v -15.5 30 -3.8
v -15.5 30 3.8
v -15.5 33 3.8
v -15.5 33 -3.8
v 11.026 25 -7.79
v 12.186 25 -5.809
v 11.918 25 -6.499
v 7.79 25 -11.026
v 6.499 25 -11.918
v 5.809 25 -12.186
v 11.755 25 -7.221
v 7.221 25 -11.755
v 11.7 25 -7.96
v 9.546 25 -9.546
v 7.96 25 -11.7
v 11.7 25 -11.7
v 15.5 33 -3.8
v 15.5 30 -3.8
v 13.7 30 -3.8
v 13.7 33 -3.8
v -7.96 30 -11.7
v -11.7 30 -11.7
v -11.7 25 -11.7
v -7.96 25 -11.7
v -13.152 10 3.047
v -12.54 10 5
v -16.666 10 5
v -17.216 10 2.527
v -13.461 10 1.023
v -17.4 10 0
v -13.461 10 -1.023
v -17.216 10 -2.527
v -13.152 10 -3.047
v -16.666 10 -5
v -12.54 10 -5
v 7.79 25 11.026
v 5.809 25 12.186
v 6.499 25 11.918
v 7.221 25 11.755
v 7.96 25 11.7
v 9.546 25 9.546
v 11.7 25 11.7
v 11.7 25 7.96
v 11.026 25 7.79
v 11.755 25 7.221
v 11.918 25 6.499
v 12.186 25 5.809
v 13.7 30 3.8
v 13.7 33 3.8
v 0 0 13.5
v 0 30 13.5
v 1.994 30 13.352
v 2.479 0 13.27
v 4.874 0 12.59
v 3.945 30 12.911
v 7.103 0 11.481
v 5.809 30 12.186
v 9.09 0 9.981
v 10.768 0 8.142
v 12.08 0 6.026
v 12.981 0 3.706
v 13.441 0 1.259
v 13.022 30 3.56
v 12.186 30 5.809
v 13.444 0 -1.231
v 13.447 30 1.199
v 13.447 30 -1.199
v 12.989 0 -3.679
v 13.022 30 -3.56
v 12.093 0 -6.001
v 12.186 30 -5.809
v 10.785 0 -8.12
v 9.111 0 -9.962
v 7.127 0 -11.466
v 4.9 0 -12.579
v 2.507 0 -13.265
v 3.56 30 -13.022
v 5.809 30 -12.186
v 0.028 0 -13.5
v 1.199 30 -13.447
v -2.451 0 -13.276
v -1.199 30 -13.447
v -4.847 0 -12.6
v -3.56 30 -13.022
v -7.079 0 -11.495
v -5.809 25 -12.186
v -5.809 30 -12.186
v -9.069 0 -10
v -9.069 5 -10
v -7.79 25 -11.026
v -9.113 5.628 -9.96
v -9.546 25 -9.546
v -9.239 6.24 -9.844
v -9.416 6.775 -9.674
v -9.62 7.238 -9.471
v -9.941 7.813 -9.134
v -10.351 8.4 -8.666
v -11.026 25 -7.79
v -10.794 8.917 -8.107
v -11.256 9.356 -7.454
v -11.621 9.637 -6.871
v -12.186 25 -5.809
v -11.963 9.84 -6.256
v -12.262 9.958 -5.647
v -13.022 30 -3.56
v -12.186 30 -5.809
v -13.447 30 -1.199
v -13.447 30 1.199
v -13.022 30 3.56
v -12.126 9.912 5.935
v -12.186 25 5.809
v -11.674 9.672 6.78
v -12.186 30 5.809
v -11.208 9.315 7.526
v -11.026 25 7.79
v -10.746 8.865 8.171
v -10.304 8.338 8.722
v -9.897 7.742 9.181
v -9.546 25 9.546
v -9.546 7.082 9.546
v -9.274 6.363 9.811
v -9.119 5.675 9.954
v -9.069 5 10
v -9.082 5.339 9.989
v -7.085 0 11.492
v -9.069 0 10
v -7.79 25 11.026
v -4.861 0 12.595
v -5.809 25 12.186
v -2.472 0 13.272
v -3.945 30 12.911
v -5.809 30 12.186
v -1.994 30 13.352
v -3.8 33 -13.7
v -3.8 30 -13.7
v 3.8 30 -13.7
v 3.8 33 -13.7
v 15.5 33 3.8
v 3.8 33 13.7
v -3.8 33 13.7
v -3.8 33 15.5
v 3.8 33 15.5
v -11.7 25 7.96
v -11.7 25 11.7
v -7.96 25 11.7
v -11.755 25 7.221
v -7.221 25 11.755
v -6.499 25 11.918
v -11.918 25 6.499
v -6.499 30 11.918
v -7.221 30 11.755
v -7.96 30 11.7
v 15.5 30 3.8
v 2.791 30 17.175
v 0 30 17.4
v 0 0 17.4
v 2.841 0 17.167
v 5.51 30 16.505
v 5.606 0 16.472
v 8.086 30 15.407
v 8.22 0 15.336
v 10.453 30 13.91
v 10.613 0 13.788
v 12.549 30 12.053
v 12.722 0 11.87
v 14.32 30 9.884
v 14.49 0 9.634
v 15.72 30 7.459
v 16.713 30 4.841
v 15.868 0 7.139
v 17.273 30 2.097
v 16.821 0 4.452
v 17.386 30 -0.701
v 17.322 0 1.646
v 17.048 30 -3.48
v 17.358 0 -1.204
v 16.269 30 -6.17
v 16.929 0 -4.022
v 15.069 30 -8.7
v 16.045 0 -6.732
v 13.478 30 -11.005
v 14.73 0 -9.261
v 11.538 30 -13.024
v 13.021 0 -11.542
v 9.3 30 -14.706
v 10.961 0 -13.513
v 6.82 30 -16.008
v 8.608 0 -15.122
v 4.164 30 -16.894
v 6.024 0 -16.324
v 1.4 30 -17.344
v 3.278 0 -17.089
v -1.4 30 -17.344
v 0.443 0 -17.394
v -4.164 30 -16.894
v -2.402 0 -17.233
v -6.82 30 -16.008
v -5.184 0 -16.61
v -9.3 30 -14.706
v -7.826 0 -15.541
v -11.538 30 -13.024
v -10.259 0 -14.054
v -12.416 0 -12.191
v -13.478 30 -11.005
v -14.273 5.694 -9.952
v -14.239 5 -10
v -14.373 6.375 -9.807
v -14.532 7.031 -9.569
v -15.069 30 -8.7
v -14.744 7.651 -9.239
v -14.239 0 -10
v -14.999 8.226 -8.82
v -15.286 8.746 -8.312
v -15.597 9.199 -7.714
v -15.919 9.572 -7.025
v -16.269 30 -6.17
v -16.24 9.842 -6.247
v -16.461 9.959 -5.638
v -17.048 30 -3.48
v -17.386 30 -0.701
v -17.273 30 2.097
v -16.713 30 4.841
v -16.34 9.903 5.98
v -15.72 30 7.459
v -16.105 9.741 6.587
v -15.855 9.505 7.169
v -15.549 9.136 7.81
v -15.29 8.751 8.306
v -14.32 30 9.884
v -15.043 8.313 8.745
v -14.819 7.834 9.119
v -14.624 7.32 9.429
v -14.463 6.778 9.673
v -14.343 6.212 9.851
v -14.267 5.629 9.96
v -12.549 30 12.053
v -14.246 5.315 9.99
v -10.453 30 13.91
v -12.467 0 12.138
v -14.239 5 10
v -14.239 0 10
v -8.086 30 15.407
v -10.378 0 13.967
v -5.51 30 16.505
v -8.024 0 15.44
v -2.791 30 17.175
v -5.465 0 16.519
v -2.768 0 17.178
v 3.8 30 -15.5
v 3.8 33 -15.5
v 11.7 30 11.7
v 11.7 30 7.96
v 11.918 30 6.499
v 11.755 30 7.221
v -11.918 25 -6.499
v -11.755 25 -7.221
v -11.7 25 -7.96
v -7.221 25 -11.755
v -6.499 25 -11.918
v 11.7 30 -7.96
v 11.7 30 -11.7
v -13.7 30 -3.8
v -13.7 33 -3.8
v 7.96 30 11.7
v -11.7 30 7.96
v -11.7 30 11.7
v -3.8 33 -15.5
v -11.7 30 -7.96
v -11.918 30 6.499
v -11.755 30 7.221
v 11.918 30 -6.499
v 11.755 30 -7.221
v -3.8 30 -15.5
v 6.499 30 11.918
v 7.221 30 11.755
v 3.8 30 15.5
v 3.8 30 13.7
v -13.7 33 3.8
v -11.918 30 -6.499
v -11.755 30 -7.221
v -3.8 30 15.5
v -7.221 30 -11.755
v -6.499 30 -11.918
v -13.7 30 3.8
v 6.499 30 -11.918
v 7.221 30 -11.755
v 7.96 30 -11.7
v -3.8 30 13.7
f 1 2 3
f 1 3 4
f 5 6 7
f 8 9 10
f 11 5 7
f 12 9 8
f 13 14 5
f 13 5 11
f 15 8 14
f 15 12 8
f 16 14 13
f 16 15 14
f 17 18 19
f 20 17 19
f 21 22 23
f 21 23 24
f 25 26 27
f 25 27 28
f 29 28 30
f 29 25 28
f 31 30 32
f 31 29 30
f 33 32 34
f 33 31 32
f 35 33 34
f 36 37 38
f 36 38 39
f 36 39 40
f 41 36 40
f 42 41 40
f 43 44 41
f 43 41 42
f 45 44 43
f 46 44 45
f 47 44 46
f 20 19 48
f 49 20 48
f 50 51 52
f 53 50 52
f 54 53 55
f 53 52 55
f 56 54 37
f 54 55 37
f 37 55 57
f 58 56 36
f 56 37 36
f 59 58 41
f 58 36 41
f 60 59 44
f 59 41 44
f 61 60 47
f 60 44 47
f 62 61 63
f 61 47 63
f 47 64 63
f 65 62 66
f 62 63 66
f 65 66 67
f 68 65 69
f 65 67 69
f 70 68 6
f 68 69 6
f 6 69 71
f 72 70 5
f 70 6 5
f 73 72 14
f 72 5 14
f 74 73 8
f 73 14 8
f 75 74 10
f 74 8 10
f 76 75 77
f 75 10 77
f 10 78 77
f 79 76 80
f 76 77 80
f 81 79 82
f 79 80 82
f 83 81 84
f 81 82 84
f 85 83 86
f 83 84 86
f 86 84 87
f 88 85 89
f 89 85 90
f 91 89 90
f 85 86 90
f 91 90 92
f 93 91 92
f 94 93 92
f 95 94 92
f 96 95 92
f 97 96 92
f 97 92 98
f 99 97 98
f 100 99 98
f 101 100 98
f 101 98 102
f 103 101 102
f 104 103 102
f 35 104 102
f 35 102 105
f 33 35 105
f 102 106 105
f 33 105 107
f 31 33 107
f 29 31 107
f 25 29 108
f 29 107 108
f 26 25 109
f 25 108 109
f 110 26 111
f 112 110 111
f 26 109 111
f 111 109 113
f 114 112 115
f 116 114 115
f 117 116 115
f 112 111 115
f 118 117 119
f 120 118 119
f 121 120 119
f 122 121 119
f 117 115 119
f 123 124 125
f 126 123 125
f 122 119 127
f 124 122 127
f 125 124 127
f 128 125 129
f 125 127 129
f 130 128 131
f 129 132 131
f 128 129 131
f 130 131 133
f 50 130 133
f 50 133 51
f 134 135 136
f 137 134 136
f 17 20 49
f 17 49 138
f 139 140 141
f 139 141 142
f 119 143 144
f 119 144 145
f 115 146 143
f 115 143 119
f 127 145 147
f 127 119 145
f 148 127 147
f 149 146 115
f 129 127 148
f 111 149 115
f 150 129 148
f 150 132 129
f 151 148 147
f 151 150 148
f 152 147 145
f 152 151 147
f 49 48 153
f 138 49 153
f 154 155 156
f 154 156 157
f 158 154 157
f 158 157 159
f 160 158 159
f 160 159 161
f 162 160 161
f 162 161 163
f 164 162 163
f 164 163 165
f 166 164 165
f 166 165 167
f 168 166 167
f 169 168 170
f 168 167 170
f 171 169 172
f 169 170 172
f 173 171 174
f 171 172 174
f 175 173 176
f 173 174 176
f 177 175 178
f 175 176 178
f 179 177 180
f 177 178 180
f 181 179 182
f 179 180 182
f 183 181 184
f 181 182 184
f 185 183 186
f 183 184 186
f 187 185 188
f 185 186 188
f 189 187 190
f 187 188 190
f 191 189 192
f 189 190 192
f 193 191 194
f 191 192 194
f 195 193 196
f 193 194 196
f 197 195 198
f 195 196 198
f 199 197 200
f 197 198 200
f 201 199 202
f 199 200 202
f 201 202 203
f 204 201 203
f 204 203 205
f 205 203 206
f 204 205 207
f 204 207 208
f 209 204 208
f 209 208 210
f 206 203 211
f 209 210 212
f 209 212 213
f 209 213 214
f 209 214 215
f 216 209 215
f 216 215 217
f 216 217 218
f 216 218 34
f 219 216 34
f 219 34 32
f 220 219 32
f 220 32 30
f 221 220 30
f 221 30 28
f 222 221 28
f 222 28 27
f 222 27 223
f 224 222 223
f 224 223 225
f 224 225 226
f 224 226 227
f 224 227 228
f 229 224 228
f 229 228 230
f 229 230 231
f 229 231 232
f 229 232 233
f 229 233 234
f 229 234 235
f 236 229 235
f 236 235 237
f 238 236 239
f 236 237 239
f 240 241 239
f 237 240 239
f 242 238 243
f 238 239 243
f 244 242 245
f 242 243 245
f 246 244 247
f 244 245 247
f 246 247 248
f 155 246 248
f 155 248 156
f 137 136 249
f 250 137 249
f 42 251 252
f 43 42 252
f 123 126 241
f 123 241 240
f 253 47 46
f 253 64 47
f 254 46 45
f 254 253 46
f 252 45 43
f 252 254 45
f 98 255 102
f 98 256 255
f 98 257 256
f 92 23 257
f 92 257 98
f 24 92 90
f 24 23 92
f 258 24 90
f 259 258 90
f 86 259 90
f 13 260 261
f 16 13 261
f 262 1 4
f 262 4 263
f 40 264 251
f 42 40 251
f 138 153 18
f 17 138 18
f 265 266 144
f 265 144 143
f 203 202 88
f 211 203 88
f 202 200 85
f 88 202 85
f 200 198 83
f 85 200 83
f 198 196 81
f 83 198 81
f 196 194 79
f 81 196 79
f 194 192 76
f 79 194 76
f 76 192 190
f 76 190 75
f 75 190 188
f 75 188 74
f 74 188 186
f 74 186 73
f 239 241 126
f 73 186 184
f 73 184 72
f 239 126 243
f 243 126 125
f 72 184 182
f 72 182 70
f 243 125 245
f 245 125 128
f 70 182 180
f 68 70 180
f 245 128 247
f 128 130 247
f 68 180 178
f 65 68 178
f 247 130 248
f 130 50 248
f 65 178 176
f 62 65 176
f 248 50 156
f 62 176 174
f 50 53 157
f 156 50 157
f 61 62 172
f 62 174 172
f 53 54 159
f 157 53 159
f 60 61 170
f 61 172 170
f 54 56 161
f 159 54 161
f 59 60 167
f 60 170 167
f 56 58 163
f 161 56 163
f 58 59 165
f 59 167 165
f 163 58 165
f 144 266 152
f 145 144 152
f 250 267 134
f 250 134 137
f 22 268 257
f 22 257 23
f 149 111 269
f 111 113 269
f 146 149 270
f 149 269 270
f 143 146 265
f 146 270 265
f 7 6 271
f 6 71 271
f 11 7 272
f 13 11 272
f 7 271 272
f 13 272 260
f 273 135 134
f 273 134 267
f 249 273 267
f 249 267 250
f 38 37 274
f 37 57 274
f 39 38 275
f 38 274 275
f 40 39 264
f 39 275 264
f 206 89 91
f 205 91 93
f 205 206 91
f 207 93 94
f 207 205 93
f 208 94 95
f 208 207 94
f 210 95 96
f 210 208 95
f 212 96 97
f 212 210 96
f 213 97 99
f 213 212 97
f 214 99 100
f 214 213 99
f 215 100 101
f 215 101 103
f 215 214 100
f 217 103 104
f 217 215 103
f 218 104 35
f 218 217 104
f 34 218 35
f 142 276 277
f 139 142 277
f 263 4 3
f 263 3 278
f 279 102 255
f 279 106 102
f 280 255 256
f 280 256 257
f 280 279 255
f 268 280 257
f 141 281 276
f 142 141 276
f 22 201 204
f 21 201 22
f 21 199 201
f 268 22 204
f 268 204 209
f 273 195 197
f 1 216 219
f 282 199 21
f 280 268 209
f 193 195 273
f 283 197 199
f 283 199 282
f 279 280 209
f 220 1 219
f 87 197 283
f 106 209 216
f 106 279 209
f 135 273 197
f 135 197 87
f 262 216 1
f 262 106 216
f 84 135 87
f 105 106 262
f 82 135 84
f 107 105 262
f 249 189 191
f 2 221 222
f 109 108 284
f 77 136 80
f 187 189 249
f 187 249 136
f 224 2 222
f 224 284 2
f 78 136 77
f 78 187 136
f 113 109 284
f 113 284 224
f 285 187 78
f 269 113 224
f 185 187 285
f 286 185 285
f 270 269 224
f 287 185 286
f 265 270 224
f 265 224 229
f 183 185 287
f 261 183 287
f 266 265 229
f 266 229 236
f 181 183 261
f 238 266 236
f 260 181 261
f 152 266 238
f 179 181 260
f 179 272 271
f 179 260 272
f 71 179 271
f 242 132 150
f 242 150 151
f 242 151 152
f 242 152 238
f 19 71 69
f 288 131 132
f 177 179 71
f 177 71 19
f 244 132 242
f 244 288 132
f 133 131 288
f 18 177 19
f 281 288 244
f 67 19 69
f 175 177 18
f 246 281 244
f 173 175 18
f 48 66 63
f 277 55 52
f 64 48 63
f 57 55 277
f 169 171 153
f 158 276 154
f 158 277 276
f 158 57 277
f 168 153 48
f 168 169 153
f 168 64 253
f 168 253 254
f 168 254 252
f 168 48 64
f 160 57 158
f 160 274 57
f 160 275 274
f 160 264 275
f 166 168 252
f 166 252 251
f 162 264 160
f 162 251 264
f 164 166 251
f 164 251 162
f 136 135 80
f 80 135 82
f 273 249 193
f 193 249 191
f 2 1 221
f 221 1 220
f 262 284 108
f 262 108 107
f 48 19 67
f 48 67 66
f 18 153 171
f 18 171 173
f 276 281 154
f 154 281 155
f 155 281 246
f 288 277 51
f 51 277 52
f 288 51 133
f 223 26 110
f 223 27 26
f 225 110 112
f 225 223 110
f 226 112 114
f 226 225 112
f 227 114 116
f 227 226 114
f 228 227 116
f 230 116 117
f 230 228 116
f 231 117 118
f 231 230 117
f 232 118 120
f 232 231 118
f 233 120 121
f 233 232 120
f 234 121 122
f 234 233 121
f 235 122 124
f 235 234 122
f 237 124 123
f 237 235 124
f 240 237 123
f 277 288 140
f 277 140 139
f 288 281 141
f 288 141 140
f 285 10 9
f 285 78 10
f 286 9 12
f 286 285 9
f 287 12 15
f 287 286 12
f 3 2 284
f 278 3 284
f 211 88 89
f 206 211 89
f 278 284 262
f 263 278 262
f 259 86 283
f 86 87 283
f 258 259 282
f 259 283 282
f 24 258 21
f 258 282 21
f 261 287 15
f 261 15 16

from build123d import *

# Parameters (mm, degrees)
SKETCH_1_R          = 17.4
EXTRUDE_1_DEPTH     = 30
SKETCH_2_R          = 13.5
CUT_EXTRUDE_1_DEPTH = 39.801030914
SKETCH_3_W          = 7.6
SKETCH_3_H          = 1.8
SKETCH_3_W_2        = 1.8
SKETCH_3_H_2        = 7.6
EXTRUDE_2_DEPTH     = 3
SKETCH_4_W          = 20
SKETCH_4_H          = 10
CUT_EXTRUDE_2_DEPTH = 42.164547854
FILLET_1_R          = 5
SKETCH_5_W          = 23.4
SKETCH_5_H          = 23.4
CUT_EXTRUDE_3_DEPTH = 5
FILLET_2_R          = 5


with BuildPart() as part:
    # 草图1 → 凸台-拉伸1 (new body)
    with BuildSketch(Plane(origin=(0, 0, 0), x_dir=(1, 0, 0), z_dir=(0, 1, 0))):
        with Locations(Location((0, 0, 0), (0, 0, 270))):
            Circle(SKETCH_1_R)
    extrude(amount=EXTRUDE_1_DEPTH)

    # 草图2 → 切除-拉伸1 (cut, through all)
    with BuildSketch(Plane(origin=(0, 30, 0), x_dir=(1, 0, 0), z_dir=(0, 1, 0))):
        with Locations(Location((0, 0, 0), (0, 0, 270))):
            Circle(SKETCH_2_R)
    extrude(amount=-CUT_EXTRUDE_1_DEPTH, mode=Mode.SUBTRACT)

    # 草图3 → 凸台-拉伸2 (add)
    with BuildSketch(Plane(origin=(0, 30, 0), x_dir=(1, 0, 0), z_dir=(0, 1, 0))):
        Polygon((13.7, 3.8), (13.7, 0), (13.7, -3.8), (15.5, -3.8), (15.5, 3.8), align=None)
        with Locations((0, -14.6)):
            Rectangle(SKETCH_3_W, SKETCH_3_H)
        with Locations((-14.6, 0)):
            Rectangle(SKETCH_3_W_2, SKETCH_3_H_2)
        with Locations((0, 14.6)):
            Rectangle(SKETCH_3_W, SKETCH_3_H)
    extrude(amount=EXTRUDE_2_DEPTH)

    # 草图4 → 切除-拉伸2 (cut, through all)
    with BuildSketch(Plane(origin=(0, 0, 0), x_dir=(0, 0, -1), z_dir=(1, 0, 0))):
        with Locations((0, 5)):
            Rectangle(SKETCH_4_W, SKETCH_4_H)
    extrude(amount=-CUT_EXTRUDE_2_DEPTH, mode=Mode.SUBTRACT)

    # 圆角1
    fillet_1_edges = [part.edges().sort_by_distance(p)[0] for p in [
        (-11.654280291, 10, -10),
        (-11.654280291, 10, 10),
    ]]
    fillet(fillet_1_edges, radius=FILLET_1_R)

    # 草图5 → 切除-拉伸3 (cut)
    with BuildSketch(Plane(origin=(0, 30, 0), x_dir=(1, 0, 0), z_dir=(0, 1, 0))):
        Rectangle(SKETCH_5_W, SKETCH_5_H)
    extrude(amount=-CUT_EXTRUDE_3_DEPTH, mode=Mode.SUBTRACT)

    # 圆角2
    fillet_2_edges = [part.edges().sort_by_distance(p)[0] for p in [
        (11.7, 27.5, -6.734983296),
        (11.7, 27.5, 6.734983296),
        (6.734983296, 27.5, 11.7),
        (-6.734983296, 27.5, 11.7),
        (-11.7, 27.5, 6.734983296),
        (-11.7, 27.5, -6.734983296),
        (-6.734983296, 27.5, -11.7),
        (6.734983296, 27.5, -11.7),
    ]]
    fillet(fillet_2_edges, radius=FILLET_2_R)


solid = part.part
